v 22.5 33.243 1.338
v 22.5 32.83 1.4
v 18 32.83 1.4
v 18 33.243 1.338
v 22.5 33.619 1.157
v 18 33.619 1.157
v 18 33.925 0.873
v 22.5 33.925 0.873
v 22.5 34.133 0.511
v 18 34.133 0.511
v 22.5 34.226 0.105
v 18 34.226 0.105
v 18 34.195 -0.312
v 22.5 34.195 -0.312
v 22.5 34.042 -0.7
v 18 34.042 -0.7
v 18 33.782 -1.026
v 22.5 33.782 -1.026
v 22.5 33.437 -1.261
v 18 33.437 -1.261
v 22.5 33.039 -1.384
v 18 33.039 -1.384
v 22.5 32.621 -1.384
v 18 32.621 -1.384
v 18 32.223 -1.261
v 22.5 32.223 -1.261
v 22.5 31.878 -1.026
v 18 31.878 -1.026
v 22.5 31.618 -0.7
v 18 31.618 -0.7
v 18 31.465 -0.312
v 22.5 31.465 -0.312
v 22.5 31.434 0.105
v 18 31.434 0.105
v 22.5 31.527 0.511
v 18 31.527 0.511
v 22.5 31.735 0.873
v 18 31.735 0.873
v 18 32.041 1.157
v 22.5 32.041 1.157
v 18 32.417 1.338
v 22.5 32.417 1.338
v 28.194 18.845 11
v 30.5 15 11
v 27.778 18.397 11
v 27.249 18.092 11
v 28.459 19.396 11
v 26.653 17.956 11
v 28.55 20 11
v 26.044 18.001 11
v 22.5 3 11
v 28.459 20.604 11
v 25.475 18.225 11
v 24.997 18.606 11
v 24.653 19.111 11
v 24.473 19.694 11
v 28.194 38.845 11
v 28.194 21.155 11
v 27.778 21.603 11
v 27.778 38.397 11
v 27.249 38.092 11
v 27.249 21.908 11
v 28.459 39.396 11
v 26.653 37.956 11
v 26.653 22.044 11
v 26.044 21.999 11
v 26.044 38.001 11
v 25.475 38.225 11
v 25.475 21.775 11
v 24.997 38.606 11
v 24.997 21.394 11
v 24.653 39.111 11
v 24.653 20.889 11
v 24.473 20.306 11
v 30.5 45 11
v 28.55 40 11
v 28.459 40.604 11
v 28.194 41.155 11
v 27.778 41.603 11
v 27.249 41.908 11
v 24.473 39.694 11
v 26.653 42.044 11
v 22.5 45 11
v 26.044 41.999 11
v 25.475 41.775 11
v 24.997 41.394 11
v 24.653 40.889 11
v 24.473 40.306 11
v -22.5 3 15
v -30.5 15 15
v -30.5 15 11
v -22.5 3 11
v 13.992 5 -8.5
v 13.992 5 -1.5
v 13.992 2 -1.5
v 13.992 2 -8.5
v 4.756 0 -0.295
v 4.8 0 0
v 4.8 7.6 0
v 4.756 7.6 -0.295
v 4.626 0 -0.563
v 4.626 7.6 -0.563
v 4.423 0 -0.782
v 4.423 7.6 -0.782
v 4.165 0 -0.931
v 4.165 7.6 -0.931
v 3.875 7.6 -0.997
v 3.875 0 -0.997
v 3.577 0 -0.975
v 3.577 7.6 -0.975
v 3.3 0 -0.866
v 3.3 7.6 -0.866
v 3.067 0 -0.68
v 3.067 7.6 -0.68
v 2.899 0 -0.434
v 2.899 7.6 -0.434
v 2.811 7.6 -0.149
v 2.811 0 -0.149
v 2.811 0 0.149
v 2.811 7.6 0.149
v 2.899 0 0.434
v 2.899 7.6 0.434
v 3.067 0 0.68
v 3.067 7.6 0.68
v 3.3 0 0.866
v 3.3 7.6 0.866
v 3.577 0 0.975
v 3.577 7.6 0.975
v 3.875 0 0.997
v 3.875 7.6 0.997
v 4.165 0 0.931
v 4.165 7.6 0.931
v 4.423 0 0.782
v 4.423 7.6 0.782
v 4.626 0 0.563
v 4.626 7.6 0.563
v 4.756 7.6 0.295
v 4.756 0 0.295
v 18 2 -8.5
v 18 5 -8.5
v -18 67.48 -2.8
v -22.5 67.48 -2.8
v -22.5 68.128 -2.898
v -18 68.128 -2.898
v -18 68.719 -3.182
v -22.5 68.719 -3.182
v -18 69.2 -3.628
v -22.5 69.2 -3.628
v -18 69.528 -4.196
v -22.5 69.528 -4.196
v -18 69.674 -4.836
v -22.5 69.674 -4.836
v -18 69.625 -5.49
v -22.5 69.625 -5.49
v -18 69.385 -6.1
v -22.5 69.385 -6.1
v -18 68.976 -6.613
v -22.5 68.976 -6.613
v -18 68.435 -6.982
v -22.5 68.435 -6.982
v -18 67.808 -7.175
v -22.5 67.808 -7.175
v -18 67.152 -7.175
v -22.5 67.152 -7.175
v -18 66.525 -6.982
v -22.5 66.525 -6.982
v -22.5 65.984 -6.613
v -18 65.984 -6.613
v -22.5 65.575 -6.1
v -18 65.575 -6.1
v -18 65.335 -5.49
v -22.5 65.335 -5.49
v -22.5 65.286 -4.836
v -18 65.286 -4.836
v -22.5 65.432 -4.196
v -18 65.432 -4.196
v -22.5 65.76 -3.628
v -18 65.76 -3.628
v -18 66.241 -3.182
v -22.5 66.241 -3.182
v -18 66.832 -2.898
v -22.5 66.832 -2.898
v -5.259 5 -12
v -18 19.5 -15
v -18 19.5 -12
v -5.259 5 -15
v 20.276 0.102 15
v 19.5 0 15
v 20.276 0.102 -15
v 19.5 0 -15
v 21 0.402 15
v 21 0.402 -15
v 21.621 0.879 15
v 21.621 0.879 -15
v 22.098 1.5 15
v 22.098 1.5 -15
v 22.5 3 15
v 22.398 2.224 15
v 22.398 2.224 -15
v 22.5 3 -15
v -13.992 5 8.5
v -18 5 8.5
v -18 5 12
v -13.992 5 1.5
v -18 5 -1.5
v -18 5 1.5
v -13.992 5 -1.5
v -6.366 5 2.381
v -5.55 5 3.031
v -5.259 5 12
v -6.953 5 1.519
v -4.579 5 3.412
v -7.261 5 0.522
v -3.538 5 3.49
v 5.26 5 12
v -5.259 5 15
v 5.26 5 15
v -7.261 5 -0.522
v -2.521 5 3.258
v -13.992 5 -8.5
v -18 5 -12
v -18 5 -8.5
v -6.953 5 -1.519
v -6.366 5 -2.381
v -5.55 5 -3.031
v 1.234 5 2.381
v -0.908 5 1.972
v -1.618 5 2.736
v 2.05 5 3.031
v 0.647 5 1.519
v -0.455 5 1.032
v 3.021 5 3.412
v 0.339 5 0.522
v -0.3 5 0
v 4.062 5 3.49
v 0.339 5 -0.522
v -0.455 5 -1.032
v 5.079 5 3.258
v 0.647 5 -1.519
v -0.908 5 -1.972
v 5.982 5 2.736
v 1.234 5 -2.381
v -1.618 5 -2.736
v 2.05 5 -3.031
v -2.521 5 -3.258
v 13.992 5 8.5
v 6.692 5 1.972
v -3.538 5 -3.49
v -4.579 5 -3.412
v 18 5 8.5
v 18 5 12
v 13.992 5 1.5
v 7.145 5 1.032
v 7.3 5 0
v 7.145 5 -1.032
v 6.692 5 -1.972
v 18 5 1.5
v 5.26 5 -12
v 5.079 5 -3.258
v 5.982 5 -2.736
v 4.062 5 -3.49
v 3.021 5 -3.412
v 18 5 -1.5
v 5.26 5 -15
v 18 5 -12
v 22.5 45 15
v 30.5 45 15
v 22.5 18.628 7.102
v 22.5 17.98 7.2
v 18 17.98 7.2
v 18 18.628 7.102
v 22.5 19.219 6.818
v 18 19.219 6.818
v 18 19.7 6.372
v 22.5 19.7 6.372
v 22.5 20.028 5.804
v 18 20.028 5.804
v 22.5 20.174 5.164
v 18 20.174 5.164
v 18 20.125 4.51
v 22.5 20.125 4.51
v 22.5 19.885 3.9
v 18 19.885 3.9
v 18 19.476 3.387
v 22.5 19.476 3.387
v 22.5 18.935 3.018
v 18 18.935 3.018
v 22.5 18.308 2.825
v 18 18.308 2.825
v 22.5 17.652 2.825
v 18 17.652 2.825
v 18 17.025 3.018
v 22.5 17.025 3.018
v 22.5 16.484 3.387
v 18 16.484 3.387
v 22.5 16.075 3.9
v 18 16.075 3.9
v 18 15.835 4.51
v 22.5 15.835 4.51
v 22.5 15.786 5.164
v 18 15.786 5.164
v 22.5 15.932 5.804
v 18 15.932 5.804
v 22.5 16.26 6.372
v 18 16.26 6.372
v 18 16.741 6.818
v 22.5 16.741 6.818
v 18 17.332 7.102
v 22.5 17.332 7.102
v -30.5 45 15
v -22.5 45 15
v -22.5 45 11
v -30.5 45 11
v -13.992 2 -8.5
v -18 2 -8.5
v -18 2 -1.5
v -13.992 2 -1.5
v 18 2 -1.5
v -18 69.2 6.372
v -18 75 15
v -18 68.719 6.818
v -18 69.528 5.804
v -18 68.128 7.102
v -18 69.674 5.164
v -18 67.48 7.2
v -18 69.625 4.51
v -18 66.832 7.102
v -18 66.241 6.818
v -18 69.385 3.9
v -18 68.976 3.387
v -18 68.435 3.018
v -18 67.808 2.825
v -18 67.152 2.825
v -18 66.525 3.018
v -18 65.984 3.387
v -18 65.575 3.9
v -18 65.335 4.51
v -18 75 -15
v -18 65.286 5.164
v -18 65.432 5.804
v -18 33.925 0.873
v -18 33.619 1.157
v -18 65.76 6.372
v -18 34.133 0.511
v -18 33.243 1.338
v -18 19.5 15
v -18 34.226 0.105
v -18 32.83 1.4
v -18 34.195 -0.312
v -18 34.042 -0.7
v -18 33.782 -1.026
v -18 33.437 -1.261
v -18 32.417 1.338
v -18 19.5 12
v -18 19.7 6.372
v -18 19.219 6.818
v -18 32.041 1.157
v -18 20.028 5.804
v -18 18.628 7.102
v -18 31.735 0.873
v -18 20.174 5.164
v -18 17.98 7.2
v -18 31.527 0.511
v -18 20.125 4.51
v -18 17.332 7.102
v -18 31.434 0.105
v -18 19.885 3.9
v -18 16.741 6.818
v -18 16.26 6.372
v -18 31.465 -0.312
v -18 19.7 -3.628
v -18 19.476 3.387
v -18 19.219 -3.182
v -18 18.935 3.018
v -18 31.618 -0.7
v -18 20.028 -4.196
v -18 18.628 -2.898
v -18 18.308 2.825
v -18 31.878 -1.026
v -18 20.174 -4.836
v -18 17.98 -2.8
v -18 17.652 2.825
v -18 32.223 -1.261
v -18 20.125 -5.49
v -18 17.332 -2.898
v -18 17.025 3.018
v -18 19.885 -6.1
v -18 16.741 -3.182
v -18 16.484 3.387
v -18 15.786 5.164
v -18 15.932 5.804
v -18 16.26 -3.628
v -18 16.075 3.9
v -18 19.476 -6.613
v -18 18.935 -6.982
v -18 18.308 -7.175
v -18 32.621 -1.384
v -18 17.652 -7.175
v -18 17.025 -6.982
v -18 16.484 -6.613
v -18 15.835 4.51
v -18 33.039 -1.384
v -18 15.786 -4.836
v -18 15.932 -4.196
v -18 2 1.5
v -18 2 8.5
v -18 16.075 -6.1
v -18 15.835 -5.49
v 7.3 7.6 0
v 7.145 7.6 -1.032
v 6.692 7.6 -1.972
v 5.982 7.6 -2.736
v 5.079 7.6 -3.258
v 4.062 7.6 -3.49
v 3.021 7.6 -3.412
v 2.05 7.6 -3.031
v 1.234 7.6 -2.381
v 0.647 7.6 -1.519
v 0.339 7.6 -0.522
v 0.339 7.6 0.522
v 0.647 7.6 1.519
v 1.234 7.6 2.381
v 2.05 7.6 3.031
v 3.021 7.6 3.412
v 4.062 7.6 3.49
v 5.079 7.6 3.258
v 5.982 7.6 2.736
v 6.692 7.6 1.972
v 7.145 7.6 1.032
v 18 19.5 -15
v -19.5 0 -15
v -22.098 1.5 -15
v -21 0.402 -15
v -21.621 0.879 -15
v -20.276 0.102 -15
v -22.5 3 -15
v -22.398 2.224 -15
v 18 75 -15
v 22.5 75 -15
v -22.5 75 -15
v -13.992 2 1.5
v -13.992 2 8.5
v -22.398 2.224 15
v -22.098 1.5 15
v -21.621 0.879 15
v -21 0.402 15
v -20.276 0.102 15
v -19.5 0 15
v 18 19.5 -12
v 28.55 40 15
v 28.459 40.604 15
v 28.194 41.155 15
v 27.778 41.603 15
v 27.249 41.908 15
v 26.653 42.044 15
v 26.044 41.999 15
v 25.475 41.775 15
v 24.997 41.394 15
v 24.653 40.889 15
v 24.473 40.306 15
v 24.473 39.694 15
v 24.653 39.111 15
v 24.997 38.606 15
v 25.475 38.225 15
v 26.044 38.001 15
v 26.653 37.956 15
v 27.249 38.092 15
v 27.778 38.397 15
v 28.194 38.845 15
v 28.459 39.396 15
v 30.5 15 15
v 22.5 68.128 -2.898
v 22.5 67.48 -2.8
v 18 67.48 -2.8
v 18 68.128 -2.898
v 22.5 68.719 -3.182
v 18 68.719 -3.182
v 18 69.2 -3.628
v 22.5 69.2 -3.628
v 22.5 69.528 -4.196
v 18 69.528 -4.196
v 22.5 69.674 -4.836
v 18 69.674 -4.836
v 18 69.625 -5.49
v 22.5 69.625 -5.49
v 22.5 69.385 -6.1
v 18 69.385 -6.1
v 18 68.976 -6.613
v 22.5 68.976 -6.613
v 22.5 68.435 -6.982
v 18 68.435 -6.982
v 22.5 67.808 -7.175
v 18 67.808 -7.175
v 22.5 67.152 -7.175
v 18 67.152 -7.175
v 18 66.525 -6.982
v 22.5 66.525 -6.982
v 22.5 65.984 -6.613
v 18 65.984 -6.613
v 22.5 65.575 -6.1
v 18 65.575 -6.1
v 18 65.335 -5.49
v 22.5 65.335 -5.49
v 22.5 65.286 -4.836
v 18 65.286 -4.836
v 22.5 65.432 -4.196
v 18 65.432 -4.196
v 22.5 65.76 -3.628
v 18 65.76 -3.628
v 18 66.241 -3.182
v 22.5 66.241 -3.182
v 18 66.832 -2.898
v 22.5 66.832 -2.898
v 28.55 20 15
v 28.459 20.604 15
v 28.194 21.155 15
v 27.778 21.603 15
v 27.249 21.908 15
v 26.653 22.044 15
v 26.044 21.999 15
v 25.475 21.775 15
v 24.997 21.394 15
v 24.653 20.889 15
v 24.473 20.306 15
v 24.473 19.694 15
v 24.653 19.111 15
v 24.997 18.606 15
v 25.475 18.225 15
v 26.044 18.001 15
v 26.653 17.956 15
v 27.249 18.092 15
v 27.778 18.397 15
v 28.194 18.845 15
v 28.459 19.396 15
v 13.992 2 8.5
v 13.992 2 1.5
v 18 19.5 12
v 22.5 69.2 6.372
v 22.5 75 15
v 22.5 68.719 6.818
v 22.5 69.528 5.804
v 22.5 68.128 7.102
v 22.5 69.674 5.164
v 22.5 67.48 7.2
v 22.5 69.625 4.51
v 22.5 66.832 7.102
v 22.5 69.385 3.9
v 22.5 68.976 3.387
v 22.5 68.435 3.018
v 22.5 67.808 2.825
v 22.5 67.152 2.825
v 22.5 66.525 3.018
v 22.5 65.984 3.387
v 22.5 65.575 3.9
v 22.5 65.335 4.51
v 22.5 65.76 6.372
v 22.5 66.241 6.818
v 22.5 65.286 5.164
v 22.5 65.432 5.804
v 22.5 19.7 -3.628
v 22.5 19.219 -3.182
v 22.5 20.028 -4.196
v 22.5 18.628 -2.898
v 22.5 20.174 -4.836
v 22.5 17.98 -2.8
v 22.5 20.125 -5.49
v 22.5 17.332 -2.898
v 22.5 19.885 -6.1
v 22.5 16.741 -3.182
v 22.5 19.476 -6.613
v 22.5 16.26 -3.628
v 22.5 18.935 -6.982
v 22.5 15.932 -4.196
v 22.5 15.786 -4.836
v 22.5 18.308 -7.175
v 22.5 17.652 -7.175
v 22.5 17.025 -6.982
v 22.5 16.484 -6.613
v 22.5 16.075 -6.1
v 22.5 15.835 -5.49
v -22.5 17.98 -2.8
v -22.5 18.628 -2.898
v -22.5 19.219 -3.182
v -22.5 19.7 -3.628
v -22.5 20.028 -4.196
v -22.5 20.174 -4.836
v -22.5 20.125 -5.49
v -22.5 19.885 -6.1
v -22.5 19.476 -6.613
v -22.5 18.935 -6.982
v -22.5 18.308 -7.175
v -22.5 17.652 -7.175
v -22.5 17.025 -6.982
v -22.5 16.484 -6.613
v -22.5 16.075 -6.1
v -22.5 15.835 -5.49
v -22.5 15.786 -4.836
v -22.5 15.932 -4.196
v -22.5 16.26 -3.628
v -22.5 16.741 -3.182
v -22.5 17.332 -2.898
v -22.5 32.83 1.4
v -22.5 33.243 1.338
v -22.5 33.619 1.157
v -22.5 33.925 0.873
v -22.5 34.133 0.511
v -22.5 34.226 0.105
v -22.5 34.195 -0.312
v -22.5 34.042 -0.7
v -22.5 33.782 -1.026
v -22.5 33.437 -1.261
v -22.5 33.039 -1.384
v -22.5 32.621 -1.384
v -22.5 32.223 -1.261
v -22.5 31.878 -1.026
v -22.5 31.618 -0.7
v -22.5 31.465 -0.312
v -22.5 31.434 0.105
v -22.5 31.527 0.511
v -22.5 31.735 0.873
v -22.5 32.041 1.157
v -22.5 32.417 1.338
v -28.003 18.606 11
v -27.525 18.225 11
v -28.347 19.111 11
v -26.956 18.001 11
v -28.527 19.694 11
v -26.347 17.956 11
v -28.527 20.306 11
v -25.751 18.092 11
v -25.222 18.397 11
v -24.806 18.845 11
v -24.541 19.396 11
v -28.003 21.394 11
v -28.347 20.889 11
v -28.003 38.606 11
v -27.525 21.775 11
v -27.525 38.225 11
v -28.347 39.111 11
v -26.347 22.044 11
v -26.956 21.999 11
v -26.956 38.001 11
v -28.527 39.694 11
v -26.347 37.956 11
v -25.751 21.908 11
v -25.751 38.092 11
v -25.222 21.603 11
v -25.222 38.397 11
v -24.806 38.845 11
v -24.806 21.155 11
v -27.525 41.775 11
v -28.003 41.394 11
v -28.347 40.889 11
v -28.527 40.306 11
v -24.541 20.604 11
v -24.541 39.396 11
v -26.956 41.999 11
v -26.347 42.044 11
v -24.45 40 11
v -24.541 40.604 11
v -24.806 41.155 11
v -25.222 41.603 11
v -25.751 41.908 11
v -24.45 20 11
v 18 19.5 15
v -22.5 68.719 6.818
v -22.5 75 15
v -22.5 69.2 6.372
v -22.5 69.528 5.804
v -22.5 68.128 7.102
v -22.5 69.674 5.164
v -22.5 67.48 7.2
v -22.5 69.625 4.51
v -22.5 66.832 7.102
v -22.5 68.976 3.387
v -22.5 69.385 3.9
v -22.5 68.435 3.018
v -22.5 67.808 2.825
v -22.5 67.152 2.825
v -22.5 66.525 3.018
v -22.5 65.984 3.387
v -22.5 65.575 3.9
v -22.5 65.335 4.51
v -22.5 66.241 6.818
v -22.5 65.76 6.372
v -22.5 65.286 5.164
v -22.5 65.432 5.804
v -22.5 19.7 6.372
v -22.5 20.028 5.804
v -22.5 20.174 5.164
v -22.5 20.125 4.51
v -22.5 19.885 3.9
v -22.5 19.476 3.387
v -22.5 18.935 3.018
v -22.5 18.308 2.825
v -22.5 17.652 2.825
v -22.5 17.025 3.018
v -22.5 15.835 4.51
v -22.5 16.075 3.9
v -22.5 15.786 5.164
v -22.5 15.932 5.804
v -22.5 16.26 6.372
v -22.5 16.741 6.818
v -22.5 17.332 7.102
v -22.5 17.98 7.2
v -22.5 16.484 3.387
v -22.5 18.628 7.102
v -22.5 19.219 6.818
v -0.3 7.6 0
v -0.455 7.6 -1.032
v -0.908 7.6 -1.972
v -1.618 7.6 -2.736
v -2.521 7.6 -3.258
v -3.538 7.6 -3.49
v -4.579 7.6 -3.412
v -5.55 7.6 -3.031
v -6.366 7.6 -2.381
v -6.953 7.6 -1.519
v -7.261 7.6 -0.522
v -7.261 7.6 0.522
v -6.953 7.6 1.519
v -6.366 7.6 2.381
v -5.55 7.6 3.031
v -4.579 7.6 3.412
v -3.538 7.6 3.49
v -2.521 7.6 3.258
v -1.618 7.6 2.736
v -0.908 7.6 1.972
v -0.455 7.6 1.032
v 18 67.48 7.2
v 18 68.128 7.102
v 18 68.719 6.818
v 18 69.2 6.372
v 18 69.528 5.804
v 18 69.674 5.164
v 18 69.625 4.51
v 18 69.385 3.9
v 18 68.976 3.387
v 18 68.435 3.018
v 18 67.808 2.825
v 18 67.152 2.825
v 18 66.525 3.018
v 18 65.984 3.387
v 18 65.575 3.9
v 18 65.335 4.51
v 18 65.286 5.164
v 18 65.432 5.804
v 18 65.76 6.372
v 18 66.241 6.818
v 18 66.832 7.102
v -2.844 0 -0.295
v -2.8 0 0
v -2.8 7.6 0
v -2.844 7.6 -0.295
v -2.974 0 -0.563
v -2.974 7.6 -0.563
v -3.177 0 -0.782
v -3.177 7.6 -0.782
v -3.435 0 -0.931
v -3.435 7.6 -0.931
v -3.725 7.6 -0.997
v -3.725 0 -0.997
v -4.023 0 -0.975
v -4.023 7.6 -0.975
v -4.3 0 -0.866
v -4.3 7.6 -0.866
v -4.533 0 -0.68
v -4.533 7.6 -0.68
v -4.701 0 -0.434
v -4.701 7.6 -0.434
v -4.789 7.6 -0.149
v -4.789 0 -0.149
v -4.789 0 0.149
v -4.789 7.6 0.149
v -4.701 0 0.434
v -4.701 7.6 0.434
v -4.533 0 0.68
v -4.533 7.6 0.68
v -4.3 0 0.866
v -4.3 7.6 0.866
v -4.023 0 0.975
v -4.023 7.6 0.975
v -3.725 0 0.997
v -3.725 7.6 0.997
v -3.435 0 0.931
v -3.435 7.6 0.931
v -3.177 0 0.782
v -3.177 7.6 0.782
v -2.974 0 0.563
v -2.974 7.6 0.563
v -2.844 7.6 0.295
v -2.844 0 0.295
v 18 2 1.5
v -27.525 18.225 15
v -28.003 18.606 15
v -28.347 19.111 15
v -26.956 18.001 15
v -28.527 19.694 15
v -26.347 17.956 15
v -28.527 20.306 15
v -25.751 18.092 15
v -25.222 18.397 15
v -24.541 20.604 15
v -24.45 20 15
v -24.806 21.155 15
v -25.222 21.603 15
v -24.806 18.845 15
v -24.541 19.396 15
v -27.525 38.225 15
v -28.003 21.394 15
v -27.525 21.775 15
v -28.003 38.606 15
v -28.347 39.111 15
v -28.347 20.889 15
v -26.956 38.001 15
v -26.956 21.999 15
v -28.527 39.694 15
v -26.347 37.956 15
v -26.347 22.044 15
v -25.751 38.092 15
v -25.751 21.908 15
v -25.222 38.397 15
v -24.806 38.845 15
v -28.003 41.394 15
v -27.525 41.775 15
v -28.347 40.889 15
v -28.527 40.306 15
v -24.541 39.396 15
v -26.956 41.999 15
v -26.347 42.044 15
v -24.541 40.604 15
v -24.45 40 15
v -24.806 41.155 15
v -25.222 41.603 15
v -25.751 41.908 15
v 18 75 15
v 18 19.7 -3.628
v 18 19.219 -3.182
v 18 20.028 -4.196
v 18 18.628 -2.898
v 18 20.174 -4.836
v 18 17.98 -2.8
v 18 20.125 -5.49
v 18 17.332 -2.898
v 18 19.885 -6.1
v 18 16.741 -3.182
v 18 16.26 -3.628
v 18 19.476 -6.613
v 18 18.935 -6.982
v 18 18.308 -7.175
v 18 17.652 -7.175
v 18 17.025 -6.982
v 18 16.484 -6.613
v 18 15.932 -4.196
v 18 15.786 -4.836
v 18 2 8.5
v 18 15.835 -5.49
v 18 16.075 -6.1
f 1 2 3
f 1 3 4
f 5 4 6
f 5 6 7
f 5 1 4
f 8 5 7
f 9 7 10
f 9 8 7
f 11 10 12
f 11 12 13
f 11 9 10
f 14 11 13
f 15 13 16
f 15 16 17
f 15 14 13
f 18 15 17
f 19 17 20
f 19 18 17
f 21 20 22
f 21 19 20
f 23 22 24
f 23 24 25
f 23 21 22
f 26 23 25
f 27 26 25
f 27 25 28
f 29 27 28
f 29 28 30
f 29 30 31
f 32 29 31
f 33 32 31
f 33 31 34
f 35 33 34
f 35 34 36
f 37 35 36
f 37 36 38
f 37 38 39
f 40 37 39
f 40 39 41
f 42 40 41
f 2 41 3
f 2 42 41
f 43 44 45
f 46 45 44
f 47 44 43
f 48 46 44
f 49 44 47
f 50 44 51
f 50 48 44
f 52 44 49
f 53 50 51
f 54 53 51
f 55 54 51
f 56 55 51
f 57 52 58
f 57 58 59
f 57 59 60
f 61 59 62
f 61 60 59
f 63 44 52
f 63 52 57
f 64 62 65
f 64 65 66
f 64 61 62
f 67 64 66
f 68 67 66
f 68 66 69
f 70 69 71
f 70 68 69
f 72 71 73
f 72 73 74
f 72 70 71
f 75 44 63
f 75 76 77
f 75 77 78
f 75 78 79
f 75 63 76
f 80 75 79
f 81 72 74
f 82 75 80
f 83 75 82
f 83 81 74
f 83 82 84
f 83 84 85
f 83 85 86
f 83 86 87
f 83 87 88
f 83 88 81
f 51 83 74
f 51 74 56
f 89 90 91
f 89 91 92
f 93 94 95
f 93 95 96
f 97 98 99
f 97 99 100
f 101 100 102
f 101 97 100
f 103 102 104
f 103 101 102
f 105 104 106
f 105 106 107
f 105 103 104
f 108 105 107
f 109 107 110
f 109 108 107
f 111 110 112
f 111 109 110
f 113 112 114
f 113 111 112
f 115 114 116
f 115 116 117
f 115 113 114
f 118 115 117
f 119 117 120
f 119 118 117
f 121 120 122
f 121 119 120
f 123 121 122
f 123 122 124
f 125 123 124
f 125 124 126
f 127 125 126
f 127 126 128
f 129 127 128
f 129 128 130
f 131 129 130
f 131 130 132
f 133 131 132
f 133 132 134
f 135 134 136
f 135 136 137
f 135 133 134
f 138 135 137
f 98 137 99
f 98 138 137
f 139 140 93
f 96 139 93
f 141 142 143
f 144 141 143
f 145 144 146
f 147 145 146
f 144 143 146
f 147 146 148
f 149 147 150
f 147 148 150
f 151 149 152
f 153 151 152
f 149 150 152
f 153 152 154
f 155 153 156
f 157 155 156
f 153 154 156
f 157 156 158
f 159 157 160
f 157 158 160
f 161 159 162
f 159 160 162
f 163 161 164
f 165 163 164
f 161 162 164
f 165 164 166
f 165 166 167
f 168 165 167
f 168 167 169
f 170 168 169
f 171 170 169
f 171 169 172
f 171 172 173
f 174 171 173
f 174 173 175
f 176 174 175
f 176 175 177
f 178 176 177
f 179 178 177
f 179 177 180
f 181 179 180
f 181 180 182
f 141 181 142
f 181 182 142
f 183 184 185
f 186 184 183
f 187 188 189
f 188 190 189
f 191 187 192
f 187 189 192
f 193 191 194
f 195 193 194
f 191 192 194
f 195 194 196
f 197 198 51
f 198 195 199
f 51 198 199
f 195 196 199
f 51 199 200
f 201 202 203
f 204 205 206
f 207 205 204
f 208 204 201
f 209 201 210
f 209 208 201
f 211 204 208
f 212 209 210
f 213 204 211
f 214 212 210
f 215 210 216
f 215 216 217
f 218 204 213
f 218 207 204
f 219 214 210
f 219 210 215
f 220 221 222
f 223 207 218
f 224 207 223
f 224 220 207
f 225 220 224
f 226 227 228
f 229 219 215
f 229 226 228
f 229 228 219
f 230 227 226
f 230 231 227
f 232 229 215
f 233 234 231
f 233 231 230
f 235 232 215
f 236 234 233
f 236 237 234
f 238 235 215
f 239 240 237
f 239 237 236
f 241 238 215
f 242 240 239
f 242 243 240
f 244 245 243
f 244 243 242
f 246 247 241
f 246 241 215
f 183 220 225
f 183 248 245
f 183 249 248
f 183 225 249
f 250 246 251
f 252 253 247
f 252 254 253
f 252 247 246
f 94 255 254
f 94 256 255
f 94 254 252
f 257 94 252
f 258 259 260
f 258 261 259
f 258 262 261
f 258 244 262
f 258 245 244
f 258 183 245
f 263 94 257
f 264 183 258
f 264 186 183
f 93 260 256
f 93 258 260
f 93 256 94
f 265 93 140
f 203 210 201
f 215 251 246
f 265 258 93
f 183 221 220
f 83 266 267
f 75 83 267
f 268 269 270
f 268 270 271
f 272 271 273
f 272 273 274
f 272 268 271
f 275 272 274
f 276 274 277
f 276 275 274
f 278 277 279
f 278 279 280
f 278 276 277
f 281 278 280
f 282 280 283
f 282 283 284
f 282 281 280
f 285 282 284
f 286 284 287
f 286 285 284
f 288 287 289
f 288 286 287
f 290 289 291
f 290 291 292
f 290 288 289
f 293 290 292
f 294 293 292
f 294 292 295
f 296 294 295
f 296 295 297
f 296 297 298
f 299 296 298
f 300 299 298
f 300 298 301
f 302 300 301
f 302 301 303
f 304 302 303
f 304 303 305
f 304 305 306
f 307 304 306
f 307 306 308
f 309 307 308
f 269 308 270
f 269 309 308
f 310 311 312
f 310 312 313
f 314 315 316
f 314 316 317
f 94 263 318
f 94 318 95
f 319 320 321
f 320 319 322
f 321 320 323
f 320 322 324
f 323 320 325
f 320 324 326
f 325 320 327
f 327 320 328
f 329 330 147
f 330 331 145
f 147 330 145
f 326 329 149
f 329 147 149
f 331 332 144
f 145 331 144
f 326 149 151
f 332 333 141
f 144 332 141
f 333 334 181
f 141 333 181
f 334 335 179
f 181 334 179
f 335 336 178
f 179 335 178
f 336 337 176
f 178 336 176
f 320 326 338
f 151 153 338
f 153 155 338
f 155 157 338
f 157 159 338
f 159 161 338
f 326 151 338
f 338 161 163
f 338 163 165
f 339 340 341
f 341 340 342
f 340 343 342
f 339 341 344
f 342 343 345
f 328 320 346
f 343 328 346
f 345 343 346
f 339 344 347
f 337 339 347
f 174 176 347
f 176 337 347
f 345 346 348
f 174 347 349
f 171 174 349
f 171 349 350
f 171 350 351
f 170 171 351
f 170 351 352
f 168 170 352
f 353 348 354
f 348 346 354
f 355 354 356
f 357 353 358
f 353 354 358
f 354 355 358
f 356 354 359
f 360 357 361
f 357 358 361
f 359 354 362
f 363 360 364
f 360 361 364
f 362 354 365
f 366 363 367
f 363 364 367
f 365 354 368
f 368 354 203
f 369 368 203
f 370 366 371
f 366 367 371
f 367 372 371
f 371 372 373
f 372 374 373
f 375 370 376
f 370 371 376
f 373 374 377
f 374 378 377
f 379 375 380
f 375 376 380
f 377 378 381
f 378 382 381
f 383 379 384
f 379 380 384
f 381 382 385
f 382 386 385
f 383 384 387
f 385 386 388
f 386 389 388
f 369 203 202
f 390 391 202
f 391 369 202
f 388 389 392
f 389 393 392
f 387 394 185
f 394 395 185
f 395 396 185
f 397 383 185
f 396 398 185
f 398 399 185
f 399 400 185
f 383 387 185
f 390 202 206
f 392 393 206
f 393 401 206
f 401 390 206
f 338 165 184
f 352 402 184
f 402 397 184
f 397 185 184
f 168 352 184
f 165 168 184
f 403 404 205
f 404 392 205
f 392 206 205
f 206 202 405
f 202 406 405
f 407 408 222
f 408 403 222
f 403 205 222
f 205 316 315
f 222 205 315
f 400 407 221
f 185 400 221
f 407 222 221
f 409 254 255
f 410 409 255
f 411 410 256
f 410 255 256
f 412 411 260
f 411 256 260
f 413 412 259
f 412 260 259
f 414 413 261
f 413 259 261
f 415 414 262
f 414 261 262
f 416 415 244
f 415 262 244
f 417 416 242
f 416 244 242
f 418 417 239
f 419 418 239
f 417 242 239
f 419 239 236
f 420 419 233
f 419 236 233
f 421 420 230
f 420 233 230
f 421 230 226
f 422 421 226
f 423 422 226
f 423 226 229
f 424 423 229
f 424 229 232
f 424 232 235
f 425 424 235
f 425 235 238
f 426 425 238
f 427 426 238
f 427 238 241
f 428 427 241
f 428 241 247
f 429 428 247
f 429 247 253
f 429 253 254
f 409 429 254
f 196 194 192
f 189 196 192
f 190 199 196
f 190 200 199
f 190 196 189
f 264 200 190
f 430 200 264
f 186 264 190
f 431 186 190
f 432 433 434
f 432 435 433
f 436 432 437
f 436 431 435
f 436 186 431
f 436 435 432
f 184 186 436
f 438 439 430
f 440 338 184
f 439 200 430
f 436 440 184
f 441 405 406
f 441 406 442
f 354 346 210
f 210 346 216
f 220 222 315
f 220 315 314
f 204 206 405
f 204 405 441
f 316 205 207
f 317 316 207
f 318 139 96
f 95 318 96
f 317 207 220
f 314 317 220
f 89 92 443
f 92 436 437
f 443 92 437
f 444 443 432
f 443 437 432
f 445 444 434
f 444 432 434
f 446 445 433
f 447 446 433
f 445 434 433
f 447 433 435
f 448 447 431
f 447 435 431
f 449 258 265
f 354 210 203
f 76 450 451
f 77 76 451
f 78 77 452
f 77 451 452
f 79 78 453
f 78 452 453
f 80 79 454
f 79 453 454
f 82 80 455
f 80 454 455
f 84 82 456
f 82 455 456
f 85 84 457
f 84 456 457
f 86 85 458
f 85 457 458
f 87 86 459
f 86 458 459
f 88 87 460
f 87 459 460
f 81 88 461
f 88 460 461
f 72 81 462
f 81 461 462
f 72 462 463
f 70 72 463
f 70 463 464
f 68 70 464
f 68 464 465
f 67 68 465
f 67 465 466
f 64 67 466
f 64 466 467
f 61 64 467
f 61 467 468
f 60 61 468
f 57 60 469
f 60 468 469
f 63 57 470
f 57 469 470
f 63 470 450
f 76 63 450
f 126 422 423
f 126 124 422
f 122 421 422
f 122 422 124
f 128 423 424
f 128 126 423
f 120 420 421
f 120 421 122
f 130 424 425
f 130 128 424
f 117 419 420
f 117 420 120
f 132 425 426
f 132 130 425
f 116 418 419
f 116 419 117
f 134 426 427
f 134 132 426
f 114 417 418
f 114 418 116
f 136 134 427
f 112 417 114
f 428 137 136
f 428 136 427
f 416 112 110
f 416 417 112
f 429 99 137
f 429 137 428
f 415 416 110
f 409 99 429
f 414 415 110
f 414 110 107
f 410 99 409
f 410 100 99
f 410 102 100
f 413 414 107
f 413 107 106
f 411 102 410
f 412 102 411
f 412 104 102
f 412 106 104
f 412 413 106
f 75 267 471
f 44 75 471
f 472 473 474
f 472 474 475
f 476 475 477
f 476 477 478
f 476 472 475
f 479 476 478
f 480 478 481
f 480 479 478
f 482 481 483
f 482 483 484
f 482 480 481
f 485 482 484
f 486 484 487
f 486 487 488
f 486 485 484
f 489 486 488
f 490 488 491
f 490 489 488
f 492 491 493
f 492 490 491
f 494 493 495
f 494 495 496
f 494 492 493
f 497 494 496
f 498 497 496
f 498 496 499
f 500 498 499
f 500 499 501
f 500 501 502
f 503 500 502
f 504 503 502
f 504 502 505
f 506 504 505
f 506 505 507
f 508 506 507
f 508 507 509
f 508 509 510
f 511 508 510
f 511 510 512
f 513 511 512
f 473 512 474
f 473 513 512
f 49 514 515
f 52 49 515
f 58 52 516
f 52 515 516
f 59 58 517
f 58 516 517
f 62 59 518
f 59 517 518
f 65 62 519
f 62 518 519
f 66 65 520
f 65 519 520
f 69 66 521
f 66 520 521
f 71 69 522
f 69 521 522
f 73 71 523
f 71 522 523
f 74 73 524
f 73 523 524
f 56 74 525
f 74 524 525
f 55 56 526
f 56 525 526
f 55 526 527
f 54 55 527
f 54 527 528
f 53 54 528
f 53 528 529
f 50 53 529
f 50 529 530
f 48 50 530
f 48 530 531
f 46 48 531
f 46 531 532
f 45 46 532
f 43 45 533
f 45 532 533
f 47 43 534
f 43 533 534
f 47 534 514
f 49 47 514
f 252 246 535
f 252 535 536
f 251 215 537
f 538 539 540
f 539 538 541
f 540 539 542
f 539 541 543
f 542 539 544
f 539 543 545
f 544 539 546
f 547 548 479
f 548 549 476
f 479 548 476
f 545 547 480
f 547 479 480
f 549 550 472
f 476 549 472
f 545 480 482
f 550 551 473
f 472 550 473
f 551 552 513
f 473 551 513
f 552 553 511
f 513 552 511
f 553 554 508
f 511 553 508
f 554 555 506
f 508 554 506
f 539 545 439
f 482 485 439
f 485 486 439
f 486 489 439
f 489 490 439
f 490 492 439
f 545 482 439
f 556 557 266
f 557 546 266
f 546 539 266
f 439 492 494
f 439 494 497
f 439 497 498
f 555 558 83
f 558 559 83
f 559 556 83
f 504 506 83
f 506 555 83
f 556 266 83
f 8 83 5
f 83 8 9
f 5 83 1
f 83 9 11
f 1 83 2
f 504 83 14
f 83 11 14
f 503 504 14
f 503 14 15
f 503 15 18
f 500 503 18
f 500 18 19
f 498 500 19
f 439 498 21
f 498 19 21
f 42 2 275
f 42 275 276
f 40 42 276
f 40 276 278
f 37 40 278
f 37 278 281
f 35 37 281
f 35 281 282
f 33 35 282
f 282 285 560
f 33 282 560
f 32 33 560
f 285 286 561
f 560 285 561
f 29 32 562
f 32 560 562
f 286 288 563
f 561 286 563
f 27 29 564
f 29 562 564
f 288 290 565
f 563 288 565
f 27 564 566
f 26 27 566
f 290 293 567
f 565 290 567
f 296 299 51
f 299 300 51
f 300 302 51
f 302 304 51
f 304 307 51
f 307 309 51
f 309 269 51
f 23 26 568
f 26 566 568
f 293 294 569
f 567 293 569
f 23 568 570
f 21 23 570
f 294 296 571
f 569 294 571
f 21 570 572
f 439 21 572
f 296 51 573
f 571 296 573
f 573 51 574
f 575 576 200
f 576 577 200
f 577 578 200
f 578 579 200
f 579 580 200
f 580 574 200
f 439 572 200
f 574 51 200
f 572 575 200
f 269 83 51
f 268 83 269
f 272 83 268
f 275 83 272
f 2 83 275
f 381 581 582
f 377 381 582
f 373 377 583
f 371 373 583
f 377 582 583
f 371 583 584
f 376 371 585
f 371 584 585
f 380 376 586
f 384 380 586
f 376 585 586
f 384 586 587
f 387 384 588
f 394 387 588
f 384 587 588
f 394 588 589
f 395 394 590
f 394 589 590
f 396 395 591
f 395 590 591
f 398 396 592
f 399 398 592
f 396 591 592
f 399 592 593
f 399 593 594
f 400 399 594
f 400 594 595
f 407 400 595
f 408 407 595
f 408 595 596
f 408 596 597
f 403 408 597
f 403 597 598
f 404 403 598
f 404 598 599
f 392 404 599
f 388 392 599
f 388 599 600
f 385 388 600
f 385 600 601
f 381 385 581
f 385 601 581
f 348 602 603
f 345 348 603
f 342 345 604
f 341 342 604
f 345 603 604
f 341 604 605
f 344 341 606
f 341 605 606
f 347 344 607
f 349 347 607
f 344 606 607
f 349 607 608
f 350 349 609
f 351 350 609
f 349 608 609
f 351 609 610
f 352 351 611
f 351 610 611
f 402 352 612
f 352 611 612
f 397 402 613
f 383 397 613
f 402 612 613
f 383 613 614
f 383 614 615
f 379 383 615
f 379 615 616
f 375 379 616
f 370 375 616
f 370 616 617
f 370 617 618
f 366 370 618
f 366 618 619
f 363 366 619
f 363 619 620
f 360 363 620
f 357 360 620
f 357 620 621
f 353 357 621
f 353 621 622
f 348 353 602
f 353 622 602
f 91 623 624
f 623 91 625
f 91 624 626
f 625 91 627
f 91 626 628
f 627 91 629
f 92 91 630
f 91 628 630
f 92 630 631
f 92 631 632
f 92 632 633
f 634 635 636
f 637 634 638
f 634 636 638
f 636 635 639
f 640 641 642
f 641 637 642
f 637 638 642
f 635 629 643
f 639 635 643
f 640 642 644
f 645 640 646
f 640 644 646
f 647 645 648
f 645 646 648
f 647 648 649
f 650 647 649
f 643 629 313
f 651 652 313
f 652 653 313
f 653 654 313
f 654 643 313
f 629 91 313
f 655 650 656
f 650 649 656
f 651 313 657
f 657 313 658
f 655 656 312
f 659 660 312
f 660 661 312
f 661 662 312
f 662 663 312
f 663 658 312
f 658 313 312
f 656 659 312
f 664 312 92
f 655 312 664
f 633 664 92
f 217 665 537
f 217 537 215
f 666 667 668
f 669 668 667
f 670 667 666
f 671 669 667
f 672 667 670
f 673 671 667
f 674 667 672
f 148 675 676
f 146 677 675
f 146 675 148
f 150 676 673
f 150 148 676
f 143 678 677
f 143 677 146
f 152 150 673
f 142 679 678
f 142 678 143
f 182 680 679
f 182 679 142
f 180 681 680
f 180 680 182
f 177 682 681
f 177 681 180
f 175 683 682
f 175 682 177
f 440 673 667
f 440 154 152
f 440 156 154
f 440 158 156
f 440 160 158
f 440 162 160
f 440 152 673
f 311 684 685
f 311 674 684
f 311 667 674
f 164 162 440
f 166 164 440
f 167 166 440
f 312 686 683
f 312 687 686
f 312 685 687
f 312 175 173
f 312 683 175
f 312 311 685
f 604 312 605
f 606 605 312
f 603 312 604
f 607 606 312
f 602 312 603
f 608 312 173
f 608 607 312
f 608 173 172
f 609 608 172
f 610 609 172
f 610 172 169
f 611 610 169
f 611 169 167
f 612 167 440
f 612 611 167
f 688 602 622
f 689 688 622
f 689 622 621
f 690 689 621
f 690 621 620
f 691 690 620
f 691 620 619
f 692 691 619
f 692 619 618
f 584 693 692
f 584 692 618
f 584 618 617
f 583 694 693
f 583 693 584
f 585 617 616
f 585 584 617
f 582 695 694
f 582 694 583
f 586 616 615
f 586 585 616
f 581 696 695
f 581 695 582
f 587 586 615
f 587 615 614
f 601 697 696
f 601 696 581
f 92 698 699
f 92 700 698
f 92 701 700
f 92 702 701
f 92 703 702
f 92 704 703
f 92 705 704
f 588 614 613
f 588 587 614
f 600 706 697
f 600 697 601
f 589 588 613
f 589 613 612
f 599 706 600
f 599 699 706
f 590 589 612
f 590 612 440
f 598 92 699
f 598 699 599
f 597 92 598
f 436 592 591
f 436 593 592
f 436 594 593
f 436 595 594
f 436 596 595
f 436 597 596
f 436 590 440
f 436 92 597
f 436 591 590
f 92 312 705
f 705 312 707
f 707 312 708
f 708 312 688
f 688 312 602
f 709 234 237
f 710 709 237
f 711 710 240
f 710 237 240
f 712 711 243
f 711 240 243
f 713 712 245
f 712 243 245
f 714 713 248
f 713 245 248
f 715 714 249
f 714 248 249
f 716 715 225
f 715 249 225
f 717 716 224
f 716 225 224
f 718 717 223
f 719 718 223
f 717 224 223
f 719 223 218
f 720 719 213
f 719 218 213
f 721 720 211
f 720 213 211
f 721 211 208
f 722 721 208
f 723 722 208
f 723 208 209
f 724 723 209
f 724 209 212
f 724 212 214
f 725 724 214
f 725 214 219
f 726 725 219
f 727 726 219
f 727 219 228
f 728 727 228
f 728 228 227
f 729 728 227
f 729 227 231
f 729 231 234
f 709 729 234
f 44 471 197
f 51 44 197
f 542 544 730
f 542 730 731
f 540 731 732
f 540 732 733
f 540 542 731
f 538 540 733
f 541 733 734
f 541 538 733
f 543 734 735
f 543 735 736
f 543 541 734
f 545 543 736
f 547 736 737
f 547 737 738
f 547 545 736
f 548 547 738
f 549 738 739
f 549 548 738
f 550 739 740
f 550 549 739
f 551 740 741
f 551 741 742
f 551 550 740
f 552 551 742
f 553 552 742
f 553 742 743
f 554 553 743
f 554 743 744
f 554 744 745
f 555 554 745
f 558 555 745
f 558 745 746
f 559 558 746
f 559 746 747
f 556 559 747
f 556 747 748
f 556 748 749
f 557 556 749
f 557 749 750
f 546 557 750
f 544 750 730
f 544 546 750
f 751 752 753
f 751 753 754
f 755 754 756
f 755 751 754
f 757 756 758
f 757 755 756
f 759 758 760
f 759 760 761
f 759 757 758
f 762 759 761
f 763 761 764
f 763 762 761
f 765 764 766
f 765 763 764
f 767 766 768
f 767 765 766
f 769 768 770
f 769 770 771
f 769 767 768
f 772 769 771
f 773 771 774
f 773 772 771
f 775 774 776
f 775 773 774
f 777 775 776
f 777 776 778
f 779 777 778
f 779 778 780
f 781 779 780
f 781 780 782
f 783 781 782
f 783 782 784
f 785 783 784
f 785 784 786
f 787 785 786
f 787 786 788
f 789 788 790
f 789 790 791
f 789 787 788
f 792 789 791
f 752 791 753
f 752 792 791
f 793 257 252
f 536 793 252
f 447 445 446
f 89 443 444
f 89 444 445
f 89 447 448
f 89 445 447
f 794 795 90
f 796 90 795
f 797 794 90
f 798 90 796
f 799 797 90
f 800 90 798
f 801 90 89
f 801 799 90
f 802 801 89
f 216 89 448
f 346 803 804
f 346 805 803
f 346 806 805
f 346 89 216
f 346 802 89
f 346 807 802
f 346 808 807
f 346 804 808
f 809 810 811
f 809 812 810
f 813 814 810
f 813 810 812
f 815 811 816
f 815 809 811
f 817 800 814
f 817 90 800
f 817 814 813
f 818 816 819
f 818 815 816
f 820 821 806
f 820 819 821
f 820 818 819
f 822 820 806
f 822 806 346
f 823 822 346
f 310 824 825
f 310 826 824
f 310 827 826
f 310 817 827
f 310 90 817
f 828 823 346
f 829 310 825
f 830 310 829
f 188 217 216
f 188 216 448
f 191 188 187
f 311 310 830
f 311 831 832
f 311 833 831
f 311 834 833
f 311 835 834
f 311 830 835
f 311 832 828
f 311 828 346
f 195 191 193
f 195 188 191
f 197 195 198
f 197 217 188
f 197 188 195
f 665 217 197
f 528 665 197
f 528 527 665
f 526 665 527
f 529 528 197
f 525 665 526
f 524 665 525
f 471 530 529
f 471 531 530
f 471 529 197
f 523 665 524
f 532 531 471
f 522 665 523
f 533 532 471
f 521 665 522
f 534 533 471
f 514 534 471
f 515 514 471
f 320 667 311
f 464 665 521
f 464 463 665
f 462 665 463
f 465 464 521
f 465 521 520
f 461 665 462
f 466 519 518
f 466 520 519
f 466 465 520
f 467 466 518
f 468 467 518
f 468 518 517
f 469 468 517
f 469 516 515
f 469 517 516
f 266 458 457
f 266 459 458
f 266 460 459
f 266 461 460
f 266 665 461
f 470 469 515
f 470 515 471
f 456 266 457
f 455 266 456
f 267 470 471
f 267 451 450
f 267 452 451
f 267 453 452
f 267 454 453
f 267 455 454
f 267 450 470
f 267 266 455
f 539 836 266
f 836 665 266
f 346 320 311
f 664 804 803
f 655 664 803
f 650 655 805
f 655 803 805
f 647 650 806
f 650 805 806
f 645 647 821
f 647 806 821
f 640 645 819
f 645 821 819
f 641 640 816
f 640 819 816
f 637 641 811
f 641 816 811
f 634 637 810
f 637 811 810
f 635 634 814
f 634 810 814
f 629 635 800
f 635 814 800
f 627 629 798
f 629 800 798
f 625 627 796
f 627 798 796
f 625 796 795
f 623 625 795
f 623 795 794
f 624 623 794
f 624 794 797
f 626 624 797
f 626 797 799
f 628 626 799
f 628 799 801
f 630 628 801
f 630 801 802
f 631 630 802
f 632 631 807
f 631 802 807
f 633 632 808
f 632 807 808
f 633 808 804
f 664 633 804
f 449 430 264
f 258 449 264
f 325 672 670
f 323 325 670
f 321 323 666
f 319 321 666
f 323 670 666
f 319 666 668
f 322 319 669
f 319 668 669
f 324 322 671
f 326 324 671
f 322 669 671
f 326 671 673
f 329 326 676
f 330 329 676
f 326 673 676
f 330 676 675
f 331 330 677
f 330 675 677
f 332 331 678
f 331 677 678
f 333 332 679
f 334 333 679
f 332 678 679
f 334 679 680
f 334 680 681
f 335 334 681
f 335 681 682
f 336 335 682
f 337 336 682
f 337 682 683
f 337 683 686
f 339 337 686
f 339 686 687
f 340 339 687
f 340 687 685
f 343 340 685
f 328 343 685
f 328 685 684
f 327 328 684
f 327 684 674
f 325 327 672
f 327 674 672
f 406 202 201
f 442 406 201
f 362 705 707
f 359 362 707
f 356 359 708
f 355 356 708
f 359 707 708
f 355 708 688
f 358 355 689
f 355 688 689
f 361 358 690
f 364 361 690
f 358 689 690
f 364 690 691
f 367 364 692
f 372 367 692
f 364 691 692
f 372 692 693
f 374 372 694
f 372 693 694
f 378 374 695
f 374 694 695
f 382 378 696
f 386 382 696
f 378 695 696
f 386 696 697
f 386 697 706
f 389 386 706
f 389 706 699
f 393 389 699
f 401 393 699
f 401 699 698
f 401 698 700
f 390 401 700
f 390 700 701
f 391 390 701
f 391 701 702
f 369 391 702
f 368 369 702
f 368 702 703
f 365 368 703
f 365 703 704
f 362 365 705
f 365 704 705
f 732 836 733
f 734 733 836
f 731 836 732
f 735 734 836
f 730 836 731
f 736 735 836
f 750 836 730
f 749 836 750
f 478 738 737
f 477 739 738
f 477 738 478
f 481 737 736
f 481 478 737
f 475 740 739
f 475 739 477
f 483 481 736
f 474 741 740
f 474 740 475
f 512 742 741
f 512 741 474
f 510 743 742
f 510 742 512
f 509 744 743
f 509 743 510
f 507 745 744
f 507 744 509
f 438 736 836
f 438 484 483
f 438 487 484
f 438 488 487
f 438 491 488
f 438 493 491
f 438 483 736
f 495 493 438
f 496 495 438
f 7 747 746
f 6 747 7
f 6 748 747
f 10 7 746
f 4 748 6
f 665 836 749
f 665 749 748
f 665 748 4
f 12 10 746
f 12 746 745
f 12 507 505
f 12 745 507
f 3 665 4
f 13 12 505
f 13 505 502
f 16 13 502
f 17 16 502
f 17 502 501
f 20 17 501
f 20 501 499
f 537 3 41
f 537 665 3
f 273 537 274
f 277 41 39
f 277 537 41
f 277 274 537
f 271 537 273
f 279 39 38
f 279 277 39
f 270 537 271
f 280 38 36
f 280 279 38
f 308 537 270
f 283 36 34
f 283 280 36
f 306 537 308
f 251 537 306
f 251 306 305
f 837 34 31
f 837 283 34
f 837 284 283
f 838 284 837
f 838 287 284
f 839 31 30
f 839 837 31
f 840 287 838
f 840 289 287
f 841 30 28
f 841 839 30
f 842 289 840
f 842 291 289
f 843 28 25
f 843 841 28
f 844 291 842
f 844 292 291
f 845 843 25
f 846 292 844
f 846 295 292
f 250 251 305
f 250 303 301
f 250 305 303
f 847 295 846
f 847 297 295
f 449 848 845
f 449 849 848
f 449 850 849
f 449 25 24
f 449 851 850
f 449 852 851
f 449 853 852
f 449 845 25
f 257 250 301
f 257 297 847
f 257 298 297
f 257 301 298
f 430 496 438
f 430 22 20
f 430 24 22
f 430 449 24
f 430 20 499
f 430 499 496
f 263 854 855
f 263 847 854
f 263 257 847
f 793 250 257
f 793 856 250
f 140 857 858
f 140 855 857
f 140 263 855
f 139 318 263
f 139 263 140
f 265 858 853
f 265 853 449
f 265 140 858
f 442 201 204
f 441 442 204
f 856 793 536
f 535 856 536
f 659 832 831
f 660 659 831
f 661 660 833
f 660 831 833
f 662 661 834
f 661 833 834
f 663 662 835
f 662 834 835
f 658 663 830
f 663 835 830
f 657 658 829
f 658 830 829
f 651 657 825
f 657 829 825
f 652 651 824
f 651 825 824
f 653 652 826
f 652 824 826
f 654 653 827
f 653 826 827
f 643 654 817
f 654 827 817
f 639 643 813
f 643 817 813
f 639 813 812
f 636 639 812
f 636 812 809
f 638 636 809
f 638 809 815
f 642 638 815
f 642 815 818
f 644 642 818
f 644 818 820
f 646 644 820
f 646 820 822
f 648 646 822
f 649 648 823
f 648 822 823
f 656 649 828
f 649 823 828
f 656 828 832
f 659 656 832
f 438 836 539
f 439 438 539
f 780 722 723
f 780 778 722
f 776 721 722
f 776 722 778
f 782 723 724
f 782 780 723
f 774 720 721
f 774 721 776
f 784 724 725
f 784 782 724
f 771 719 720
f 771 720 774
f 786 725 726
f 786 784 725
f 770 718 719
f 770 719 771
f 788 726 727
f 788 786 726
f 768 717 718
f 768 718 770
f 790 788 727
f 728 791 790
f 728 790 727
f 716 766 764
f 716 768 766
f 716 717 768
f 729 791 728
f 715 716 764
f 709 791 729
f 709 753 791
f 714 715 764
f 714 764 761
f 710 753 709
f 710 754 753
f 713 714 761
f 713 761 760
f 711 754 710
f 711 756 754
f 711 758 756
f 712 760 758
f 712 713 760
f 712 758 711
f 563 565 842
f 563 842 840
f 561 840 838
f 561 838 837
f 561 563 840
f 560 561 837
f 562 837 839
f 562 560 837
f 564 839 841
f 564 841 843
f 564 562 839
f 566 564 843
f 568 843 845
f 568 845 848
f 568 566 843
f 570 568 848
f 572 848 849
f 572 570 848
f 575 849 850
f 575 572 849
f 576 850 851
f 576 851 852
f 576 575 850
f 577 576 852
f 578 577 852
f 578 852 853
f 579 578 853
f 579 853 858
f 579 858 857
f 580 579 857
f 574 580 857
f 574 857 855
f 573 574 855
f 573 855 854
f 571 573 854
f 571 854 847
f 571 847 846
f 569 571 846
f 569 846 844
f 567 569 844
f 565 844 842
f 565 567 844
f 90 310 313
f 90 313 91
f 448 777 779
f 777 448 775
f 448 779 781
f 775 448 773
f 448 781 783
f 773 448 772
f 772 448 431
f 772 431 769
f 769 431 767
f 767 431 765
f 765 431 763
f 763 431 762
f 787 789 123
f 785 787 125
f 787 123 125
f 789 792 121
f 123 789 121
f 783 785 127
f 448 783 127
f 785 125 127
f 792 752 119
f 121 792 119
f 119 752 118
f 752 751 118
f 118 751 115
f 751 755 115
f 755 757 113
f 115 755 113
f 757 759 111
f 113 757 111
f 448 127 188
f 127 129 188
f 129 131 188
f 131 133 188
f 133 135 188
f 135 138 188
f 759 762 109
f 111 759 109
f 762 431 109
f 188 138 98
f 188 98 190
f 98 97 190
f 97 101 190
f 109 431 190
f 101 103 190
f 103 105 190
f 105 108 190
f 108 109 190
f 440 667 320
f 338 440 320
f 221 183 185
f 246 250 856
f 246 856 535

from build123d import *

# Parameters (mm, degrees)
SKETCH1_W           = 45
SKETCH1_H           = 30
SKETCH1_R           = 3.5
BOSS_EXTRUDE1_DEPTH = 5
SKETCH1_4_R         = 3.5
SKETCH1_4_R_2       = 1
BOSS_EXTRUDE2_DEPTH = 7.6
SKETCH2_W           = 4.5
SKETCH2_H           = 30
BOSS_EXTRUDE3_DEPTH = 70
SKETCH3_R           = 1.4
SKETCH3_R_2         = 2.2
CUT_EXTRUDE1_DEPTH  = 4.5
FILLET1_R           = 3
SKETCH6_W           = 4.008200323
SKETCH6_H           = 7
CUT_EXTRUDE3_DEPTH  = 3
BOSS_EXTRUDE4_DEPTH = 3
SKETCH8_R           = 2.05
BOSS_EXTRUDE5_DEPTH = 4


with BuildPart() as part:
    # Sketch1 → Boss-Extrude1 (new body)
    with BuildSketch(Plane(origin=(0, 0, 0), x_dir=(1, 0, 0), z_dir=(0, 1, 0))):
        Rectangle(SKETCH1_W, SKETCH1_H)
        with Locations((-3.8, 0)):
            Circle(SKETCH1_R, mode=Mode.SUBTRACT)
        with Locations((3.8, 0)):
            Circle(SKETCH1_R, mode=Mode.SUBTRACT)
    extrude(amount=BOSS_EXTRUDE1_DEPTH)

    # Sketch1<4> → Boss-Extrude2 (add)
    # profile 1 of 2: a face of its own
    with BuildSketch(Plane(origin=(0, 0, 0), x_dir=(1, 0, 0), z_dir=(0, 1, 0))):
        with Locations((-3.8, 0)):
            Circle(SKETCH1_4_R)
        with Locations((-3.8, 0)):
            Circle(SKETCH1_4_R_2, mode=Mode.SUBTRACT)
    # profile 2 of 2: a face of its own
    with BuildSketch(Plane(origin=(0, 0, 0), x_dir=(1, 0, 0), z_dir=(0, 1, 0))):
        with Locations((3.8, 0)):
            Circle(SKETCH1_4_R)
        with Locations((3.8, 0)):
            Circle(SKETCH1_4_R_2, mode=Mode.SUBTRACT)
    extrude(amount=BOSS_EXTRUDE2_DEPTH)

    # Sketch2 → Boss-Extrude3 (add)
    with BuildSketch(Plane(origin=(0, 5, 0), x_dir=(1, 0, 0), z_dir=(0, 1, 0))):
        with Locations((-20.25, 0)):
            Rectangle(SKETCH2_W, SKETCH2_H)
        with Locations((20.25, 0)):
            Rectangle(SKETCH2_W, SKETCH2_H)
    extrude(amount=BOSS_EXTRUDE3_DEPTH)

    # Sketch3 → Cut-Extrude1 (cut)
    with BuildSketch(Plane.ZY.offset(22.5)):
        with Locations((0, 32.83)):
            Circle(SKETCH3_R)
        with Locations((5, 17.98)):
            Circle(SKETCH3_R_2)
        with Locations((-5, 17.98)):
            Circle(SKETCH3_R_2)
        with Locations((-5, 67.48)):
            Circle(SKETCH3_R_2)
        with Locations((5, 67.48)):
            Circle(SKETCH3_R_2)
    cut_extrude1 = extrude(amount=-CUT_EXTRUDE1_DEPTH, mode=Mode.SUBTRACT)

    # Fillet1
    fillet1_edges = [part.edges().sort_by_distance(p)[0] for p in [
        (22.5, 0, 0),
        (-22.5, 0, 0),
    ]]
    fillet(fillet1_edges, radius=FILLET1_R)

    # Sketch6 → Cut-Extrude3 (cut)
    with BuildSketch(Plane(origin=(0, 5, 0), x_dir=(1, 0, 0), z_dir=(0, 1, 0))):
        with Locations((-15.995899839, 5)):
            Rectangle(SKETCH6_W, SKETCH6_H)
        with Locations((-15.995899839, -5)):
            Rectangle(SKETCH6_W, SKETCH6_H)
    cut_extrude3 = extrude(amount=-CUT_EXTRUDE3_DEPTH, mode=Mode.SUBTRACT)

    # Mirror1: Cut-Extrude1, Cut-Extrude3 across plane
    add(cut_extrude1.mirror(Plane(origin=(0, 0, 0), x_dir=(0, 0, 1), z_dir=(1, 0, 0))), mode=Mode.SUBTRACT)
    add(cut_extrude3.mirror(Plane(origin=(0, 0, 0), x_dir=(0, 0, 1), z_dir=(1, 0, 0))), mode=Mode.SUBTRACT)

    # Sketch7 → Boss-Extrude4 (add)
    with BuildSketch(Plane.XY.offset(15)):
        Polygon((-18, 19.5), (-5.259164302, 5), (-18, 5), align=None)
        Polygon((5.26, 5), (18, 5), (18, 19.5), align=None)
    boss_extrude4 = extrude(amount=-BOSS_EXTRUDE4_DEPTH)

    # Mirror2: Boss-Extrude4 across plane
    add(boss_extrude4.mirror(Plane.XY))

    # Sketch8 → Boss-Extrude5 (add)
    # profile 1 of 2: a face of its own
    with BuildSketch(Plane.XY.offset(15)):
        Polygon((-22.5, 15), (-22.5, 45), (-30.5, 45), (-30.5, 15), (-22.5, 3), align=None)
        with Locations((-26.5, 40)):
            Circle(SKETCH8_R, mode=Mode.SUBTRACT)
        with Locations((-26.5, 20)):
            Circle(SKETCH8_R, mode=Mode.SUBTRACT)
    # profile 2 of 2: a face of its own
    with BuildSketch(Plane.XY.offset(15)):
        Polygon((30.5, 15), (22.5, 3), (22.5, 15), (22.5, 45), (30.5, 45), align=None)
        with Locations((26.5, 20)):
            Circle(SKETCH8_R, mode=Mode.SUBTRACT)
        with Locations((26.5, 40)):
            Circle(SKETCH8_R, mode=Mode.SUBTRACT)
    extrude(amount=-BOSS_EXTRUDE5_DEPTH)


solid = part.part
